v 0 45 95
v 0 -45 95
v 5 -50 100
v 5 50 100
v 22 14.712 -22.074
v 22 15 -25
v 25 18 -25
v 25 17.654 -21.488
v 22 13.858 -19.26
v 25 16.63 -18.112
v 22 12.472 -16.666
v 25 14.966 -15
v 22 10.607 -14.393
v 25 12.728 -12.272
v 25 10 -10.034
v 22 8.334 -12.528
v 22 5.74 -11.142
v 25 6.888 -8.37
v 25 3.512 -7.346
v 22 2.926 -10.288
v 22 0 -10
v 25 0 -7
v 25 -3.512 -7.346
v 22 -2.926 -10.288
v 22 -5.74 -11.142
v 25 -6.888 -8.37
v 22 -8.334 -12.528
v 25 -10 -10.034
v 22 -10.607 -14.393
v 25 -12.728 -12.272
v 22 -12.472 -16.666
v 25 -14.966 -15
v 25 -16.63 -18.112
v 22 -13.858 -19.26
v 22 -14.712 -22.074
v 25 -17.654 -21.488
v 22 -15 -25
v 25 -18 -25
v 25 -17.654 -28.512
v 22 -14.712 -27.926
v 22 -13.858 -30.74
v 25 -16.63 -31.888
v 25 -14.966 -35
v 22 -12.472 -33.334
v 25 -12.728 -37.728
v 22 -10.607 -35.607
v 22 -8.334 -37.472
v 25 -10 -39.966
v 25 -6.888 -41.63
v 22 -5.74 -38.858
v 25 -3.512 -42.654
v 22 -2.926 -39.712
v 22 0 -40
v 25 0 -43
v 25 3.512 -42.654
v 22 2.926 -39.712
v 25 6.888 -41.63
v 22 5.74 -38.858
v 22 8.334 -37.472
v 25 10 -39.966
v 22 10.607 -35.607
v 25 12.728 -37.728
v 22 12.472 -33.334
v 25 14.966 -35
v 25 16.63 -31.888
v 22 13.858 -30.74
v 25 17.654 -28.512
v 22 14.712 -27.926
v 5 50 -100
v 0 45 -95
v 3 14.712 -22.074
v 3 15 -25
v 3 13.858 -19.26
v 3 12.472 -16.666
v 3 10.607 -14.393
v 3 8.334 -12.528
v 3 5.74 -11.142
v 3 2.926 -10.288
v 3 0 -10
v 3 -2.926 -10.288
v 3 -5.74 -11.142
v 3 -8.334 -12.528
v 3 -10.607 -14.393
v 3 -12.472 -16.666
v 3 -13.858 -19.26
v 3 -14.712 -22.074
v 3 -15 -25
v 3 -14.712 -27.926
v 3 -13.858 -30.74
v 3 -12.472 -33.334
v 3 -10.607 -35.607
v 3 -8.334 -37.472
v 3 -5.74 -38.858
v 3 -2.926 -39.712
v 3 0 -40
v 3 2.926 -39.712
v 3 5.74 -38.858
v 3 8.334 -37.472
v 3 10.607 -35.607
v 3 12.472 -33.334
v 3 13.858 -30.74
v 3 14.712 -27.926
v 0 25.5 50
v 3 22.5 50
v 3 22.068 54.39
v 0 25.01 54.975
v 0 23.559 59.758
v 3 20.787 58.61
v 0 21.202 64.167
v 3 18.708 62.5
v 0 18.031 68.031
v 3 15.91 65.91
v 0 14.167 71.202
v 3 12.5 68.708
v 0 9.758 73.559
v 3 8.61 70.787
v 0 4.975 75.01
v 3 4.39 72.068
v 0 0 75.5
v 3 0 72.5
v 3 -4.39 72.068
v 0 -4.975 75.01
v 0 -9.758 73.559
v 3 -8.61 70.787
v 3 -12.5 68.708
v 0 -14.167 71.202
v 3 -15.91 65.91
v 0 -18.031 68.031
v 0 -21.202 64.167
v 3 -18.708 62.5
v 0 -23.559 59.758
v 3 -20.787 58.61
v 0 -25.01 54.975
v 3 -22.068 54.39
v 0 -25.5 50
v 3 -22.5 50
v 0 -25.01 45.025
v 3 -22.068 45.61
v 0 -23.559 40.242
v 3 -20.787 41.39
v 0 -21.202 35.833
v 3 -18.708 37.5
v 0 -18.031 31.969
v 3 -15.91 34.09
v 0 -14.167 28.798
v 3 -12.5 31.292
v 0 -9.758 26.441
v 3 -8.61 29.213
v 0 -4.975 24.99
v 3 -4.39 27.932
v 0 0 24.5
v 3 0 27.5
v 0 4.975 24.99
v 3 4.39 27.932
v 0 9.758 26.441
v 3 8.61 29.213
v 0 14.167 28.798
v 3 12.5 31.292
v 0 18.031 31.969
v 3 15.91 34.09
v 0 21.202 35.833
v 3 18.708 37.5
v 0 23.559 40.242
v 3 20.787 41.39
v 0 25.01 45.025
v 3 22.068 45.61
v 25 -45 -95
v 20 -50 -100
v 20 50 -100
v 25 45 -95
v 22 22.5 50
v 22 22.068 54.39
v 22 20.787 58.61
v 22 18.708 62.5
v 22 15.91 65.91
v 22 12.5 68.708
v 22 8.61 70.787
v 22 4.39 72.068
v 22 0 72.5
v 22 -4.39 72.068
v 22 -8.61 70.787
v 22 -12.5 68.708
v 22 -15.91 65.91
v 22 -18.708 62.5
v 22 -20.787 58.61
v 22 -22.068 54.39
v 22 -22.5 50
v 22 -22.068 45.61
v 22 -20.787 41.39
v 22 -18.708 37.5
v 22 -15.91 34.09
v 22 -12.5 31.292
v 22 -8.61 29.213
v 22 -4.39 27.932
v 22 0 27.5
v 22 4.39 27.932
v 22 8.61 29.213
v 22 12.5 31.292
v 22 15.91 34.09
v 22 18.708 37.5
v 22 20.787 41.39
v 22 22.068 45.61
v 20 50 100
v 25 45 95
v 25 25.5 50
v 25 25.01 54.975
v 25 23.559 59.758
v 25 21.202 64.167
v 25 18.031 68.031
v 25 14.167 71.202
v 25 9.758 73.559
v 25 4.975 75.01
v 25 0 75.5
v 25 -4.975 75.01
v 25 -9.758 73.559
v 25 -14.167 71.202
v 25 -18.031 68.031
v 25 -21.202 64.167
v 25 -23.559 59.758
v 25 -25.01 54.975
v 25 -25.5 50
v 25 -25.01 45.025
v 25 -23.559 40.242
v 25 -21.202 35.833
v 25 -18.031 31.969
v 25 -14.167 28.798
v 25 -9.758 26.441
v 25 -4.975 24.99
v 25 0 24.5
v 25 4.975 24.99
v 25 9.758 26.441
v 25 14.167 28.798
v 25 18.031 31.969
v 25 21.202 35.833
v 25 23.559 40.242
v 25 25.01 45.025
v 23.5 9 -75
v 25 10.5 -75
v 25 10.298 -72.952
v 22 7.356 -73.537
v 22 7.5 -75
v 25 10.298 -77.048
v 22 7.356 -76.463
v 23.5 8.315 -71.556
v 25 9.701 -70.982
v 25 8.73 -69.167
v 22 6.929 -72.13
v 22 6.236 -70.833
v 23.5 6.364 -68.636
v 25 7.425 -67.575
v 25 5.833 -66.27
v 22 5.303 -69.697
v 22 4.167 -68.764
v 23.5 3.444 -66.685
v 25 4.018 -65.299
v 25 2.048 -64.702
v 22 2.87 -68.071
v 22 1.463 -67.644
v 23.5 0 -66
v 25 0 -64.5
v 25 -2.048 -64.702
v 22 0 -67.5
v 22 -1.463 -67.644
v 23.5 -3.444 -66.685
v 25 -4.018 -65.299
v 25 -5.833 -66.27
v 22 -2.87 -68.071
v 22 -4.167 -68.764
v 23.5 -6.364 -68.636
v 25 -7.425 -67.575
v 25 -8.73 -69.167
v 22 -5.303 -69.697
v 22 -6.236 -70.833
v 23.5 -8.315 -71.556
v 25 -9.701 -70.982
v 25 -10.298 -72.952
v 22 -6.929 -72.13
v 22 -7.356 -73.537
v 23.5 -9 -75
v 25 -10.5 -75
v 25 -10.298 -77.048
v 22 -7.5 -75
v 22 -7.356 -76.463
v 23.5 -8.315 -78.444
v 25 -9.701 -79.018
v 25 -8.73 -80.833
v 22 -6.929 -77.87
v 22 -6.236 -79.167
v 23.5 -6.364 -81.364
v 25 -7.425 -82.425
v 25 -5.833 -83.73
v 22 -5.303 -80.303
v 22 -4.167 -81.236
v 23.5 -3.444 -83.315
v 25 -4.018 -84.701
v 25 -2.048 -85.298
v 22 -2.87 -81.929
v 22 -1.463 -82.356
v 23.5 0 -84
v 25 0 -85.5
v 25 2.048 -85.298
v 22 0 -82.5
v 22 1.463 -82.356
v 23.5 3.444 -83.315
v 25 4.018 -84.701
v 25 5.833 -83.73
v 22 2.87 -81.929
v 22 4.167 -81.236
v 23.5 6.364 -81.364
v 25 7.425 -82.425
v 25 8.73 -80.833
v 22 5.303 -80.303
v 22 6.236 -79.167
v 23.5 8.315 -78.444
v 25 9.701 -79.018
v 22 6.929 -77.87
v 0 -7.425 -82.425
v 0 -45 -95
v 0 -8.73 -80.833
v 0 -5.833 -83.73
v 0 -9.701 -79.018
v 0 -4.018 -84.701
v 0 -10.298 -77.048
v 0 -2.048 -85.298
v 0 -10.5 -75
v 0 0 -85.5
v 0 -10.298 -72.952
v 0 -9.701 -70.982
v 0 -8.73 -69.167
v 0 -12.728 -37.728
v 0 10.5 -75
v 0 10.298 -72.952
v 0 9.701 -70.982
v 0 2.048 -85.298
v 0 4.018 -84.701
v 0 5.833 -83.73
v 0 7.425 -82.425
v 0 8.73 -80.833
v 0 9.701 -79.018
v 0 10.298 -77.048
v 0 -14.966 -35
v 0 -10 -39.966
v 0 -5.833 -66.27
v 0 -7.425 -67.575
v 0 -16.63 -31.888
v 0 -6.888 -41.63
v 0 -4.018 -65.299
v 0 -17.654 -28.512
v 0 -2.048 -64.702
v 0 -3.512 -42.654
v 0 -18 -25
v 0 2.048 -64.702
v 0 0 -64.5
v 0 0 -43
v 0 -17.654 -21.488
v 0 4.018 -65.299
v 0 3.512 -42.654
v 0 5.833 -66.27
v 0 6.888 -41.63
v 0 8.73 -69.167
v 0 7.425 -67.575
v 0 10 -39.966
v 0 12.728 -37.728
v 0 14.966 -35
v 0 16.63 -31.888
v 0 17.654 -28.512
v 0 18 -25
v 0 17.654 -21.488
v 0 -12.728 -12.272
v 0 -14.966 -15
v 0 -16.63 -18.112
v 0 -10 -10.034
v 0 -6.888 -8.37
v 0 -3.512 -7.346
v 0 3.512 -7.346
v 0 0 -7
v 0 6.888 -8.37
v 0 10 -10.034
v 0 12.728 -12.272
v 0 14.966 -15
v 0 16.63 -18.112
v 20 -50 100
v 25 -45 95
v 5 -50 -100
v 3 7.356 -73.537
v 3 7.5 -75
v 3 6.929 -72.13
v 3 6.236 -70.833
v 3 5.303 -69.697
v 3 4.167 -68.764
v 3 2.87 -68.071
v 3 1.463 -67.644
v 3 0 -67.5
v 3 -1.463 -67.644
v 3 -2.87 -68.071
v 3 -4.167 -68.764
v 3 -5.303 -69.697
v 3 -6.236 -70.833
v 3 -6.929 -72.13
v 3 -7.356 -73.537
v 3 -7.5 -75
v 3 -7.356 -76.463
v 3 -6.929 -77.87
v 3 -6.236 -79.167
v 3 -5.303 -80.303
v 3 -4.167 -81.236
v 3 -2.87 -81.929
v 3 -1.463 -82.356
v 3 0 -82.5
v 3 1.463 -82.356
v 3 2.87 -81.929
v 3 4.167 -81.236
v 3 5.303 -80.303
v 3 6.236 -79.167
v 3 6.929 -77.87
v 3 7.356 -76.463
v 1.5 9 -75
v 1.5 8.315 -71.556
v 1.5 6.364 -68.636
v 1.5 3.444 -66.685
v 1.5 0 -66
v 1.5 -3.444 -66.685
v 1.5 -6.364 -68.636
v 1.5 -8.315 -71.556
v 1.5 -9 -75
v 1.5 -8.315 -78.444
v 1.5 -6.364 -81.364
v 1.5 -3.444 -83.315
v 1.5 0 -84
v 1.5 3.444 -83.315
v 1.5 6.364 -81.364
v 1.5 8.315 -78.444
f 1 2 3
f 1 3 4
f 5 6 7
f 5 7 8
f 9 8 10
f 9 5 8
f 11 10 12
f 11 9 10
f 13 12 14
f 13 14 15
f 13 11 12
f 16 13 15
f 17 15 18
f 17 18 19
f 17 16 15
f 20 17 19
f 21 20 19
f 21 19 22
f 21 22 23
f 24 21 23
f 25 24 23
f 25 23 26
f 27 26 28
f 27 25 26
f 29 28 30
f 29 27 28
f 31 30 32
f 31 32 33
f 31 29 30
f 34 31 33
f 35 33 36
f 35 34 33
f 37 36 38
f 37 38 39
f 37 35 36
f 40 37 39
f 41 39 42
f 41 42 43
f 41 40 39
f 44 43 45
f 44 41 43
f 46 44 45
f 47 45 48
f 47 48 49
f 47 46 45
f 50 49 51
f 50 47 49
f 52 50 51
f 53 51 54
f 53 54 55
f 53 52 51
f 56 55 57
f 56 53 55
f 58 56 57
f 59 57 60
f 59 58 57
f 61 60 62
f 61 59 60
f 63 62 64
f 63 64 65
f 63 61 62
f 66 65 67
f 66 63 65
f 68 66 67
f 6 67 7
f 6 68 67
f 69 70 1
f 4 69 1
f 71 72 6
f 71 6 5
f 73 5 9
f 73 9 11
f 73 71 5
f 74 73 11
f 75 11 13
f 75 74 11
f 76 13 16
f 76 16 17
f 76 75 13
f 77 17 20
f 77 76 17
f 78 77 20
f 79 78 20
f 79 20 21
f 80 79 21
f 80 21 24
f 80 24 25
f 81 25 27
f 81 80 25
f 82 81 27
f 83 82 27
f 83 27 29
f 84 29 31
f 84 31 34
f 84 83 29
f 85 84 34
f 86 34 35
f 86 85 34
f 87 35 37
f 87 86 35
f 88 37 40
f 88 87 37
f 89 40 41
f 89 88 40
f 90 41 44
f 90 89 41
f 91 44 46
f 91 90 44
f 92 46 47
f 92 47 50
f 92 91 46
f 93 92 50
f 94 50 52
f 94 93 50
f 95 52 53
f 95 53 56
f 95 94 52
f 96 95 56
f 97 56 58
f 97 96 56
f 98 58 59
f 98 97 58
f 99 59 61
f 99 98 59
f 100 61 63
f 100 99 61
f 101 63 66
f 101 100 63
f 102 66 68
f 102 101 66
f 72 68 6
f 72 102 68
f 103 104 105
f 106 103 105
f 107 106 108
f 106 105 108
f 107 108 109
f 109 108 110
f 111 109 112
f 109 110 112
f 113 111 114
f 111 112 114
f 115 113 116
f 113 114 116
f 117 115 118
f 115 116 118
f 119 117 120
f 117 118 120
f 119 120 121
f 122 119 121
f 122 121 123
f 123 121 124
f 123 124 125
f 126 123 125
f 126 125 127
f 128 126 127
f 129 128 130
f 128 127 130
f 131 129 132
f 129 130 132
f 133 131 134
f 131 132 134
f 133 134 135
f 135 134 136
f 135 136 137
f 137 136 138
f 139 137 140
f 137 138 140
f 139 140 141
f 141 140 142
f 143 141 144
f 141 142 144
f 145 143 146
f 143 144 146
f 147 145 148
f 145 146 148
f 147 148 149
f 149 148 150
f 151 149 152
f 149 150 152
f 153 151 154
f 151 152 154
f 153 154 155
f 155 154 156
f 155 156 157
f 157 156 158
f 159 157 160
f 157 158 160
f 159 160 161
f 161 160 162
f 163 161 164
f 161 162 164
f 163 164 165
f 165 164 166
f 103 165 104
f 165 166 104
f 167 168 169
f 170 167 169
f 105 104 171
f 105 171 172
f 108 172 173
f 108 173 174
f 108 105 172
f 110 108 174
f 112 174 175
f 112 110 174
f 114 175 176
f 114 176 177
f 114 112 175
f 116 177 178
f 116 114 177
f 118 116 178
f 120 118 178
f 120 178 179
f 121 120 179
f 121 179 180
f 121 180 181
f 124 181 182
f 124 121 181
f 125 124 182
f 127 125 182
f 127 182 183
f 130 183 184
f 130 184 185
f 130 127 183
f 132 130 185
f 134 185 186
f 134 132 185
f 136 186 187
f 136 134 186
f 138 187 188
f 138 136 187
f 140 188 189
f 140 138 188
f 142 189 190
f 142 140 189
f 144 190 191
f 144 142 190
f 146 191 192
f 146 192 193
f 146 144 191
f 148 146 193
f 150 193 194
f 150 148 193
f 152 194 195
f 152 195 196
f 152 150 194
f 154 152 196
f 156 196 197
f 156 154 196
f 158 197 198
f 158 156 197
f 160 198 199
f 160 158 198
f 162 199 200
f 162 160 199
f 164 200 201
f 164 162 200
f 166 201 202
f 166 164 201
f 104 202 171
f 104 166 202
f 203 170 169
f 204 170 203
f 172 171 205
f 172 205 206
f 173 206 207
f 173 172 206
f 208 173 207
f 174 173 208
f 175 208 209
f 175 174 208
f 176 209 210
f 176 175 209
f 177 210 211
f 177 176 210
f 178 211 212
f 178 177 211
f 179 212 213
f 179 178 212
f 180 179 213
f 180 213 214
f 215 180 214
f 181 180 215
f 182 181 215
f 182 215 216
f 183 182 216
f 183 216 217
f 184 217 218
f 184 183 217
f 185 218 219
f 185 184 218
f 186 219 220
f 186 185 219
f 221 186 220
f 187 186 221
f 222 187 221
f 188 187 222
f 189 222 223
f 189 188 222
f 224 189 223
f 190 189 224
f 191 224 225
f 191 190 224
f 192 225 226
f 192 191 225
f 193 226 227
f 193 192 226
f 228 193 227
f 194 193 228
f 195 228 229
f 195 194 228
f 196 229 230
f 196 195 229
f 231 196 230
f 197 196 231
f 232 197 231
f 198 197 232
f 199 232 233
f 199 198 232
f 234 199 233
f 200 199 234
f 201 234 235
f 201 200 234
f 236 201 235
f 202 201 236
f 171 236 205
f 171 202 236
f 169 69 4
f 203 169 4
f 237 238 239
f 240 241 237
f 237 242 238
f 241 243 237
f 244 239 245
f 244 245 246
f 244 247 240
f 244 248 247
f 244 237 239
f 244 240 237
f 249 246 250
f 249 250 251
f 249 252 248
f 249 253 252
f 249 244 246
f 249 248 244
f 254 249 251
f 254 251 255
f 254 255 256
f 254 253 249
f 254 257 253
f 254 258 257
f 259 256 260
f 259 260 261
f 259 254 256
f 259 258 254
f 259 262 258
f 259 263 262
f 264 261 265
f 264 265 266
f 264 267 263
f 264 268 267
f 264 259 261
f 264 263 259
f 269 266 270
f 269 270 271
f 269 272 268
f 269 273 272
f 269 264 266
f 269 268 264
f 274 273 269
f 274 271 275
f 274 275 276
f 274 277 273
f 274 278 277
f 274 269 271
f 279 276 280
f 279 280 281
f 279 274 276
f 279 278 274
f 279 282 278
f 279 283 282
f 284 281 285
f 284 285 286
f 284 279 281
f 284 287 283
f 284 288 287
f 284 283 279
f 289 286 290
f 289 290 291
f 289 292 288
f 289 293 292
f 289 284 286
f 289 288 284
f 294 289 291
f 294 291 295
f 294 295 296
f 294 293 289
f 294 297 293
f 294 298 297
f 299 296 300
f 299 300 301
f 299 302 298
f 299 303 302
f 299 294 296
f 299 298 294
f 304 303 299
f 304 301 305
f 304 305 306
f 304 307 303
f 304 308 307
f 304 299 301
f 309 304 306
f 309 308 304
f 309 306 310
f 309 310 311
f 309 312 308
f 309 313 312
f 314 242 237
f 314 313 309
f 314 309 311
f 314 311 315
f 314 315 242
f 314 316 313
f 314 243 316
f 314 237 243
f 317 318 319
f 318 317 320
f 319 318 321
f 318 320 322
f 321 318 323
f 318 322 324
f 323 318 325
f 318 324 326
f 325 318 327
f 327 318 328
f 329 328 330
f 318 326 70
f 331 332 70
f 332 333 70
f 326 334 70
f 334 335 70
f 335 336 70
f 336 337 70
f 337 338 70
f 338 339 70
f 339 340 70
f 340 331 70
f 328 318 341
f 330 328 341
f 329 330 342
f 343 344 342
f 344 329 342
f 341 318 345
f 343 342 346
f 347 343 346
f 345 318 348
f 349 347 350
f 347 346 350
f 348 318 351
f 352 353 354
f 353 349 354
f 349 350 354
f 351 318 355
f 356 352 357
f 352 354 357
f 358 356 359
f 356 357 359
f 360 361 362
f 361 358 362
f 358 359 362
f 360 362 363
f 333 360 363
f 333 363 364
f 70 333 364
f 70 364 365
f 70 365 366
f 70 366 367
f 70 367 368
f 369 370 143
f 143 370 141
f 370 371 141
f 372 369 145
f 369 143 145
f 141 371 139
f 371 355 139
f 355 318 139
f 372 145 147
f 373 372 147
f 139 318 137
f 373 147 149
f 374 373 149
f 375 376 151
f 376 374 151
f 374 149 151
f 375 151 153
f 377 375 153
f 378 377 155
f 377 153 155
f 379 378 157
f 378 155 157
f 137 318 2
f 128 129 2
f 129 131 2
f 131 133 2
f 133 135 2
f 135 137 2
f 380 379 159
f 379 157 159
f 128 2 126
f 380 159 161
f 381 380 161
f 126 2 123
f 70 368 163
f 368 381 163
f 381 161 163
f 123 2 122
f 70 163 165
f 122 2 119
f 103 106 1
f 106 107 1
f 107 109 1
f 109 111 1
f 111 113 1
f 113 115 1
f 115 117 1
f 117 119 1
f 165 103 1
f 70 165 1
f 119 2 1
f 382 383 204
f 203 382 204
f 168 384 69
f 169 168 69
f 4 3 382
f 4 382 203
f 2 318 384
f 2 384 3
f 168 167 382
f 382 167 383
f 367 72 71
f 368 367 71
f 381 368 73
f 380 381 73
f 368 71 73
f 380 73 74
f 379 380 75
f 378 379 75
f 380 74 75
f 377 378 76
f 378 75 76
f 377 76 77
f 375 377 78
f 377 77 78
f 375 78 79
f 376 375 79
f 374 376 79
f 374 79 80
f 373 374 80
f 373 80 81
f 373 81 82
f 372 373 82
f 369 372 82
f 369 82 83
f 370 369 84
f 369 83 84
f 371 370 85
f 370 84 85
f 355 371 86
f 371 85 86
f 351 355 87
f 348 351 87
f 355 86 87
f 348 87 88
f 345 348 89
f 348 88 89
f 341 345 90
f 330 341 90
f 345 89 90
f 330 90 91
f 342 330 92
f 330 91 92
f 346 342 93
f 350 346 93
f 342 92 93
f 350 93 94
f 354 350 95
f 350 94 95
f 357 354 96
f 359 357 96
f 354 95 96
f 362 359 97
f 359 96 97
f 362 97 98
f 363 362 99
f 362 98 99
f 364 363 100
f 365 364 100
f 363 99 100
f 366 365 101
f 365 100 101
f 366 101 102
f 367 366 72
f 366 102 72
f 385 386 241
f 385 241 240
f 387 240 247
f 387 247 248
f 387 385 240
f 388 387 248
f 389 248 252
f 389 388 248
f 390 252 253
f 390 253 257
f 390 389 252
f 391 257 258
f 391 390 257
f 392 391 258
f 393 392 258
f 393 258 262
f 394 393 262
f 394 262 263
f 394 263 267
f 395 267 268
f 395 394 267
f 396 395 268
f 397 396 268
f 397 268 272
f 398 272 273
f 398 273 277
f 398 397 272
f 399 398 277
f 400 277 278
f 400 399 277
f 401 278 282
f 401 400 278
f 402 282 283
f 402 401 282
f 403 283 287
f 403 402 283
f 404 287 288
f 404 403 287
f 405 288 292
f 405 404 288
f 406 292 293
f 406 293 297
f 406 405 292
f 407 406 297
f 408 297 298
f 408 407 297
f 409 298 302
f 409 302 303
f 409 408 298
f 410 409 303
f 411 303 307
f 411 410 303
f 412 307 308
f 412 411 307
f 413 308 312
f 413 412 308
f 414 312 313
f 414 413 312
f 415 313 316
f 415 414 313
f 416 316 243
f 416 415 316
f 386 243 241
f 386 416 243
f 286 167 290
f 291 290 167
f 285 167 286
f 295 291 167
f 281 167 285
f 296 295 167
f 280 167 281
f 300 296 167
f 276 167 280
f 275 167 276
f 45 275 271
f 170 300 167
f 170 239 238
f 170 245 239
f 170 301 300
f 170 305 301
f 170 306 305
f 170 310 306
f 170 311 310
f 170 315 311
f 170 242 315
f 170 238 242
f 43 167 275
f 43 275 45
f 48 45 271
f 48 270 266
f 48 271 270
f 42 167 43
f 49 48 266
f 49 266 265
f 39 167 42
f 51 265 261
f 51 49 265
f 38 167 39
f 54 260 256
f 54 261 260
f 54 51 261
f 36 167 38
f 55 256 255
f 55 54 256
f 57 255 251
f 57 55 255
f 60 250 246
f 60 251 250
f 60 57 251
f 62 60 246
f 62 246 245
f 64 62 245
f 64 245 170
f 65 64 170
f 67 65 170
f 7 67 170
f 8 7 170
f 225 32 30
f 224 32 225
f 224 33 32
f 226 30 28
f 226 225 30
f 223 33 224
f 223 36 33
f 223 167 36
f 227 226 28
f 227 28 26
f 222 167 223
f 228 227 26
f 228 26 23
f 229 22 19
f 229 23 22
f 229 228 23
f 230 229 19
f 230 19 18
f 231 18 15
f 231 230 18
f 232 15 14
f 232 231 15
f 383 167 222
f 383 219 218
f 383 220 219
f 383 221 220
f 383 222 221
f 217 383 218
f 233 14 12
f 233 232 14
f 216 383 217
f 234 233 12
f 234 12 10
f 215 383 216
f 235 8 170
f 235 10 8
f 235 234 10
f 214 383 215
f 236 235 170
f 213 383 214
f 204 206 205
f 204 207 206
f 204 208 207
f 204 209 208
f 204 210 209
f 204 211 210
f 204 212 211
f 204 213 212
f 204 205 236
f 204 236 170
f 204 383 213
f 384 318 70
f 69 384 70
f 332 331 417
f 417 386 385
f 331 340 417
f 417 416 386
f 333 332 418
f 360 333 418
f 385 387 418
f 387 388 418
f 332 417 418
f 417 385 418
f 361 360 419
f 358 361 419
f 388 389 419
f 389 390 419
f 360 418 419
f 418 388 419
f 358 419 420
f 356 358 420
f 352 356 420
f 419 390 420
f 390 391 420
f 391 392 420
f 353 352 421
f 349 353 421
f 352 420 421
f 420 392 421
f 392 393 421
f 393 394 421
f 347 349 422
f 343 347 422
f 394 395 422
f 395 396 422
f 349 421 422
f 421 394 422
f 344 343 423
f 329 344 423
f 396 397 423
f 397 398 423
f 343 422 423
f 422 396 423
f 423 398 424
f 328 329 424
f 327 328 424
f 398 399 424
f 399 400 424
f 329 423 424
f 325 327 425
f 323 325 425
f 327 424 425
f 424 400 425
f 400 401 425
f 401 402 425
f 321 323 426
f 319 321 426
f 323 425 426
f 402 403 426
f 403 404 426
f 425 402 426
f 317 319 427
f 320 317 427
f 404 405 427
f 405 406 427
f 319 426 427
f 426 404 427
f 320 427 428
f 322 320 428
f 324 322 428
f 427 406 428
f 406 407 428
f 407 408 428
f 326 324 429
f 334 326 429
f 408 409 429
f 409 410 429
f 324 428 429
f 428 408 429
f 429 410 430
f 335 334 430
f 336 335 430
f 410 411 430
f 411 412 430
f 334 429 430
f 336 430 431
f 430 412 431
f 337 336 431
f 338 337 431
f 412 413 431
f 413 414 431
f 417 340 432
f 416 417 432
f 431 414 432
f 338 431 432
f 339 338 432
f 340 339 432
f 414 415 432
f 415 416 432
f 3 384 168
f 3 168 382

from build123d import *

# Parameters (mm, degrees)
F0_W     = 100
F0_H     = 200
F0_R     = 7.5
F0_R_2   = 15
F0_R_3   = 22.5
F1_DEPTH = 25
F2_SIZE  = 5
F3_DEPTH = 25
F4_SIZE  = 5
F5_SIZE  = 3


# Not quite as in the source:
# - a feature names something its author has since deleted; it is built from what else it names


with BuildPart() as f1:
    # F0 (on Right) → F1 (new body)
    with BuildSketch(Plane.YZ):
        Rectangle(F0_W, F0_H)
        with Locations((0, -75)):
            Circle(F0_R, mode=Mode.SUBTRACT)
        with Locations((0, -25)):
            Circle(F0_R_2, mode=Mode.SUBTRACT)
        with Locations((0, 50)):
            Circle(F0_R_3, mode=Mode.SUBTRACT)
    extrude(amount=F1_DEPTH)

    # F2
    f2_edges = [f1.edges().sort_by_distance(p)[0] for p in [
        (25, 50, 0),
        (0, 50, 0),
        (12.5, 22.5, 50),
        (0, -22.5, 50),
        (25, -22.5, 50),
        (12.5, 7.5, -75),
        (0, -7.5, -75),
        (25, -7.5, -75),
        (0, -50, 0),
        (25, -50, 0),
        (25, 0, -100),
        (0, 0, -100),
        (0, 0, 100),
        (25, 0, 100),
    ]]
    chamfer(f2_edges, length=F2_SIZE)

    # F0 (on Right) → F3 (join)
    with BuildSketch(Plane.YZ):
        Rectangle(F0_W, F0_H)
        with Locations((0, -75)):
            Circle(F0_R, mode=Mode.SUBTRACT)
        with Locations((0, -25)):
            Circle(F0_R_2, mode=Mode.SUBTRACT)
        with Locations((0, 50)):
            Circle(F0_R_3, mode=Mode.SUBTRACT)
    extrude(amount=F3_DEPTH)

    # F4
    f4_edges = [f1.edges().sort_by_distance(p)[0] for p in [
        (25, 0, 100),
        (25, -50, 0),
        (25, 0, -100),
        (25, 50, 0),
        (0, -50, 0),
        (0, 0, 100),
        (0, 50, 0),
        (0, 0, -100),
    ]]
    chamfer(f4_edges, length=F4_SIZE)

    # F5
    f5_edges = [f1.edges().sort_by_distance(p)[0] for p in [
        (0, -22.5, 50),
        (12.5, 22.5, 50),
        (25, -22.5, 50),
        (12.5, 15, -25),
        (0, -15, -25),
        (25, -15, -25),
        (0, -7.5, -75),
        (12.5, 7.5, -75),
        (25, -7.5, -75),
    ]]
    chamfer(f5_edges, length=F5_SIZE)


solid = f1.part
